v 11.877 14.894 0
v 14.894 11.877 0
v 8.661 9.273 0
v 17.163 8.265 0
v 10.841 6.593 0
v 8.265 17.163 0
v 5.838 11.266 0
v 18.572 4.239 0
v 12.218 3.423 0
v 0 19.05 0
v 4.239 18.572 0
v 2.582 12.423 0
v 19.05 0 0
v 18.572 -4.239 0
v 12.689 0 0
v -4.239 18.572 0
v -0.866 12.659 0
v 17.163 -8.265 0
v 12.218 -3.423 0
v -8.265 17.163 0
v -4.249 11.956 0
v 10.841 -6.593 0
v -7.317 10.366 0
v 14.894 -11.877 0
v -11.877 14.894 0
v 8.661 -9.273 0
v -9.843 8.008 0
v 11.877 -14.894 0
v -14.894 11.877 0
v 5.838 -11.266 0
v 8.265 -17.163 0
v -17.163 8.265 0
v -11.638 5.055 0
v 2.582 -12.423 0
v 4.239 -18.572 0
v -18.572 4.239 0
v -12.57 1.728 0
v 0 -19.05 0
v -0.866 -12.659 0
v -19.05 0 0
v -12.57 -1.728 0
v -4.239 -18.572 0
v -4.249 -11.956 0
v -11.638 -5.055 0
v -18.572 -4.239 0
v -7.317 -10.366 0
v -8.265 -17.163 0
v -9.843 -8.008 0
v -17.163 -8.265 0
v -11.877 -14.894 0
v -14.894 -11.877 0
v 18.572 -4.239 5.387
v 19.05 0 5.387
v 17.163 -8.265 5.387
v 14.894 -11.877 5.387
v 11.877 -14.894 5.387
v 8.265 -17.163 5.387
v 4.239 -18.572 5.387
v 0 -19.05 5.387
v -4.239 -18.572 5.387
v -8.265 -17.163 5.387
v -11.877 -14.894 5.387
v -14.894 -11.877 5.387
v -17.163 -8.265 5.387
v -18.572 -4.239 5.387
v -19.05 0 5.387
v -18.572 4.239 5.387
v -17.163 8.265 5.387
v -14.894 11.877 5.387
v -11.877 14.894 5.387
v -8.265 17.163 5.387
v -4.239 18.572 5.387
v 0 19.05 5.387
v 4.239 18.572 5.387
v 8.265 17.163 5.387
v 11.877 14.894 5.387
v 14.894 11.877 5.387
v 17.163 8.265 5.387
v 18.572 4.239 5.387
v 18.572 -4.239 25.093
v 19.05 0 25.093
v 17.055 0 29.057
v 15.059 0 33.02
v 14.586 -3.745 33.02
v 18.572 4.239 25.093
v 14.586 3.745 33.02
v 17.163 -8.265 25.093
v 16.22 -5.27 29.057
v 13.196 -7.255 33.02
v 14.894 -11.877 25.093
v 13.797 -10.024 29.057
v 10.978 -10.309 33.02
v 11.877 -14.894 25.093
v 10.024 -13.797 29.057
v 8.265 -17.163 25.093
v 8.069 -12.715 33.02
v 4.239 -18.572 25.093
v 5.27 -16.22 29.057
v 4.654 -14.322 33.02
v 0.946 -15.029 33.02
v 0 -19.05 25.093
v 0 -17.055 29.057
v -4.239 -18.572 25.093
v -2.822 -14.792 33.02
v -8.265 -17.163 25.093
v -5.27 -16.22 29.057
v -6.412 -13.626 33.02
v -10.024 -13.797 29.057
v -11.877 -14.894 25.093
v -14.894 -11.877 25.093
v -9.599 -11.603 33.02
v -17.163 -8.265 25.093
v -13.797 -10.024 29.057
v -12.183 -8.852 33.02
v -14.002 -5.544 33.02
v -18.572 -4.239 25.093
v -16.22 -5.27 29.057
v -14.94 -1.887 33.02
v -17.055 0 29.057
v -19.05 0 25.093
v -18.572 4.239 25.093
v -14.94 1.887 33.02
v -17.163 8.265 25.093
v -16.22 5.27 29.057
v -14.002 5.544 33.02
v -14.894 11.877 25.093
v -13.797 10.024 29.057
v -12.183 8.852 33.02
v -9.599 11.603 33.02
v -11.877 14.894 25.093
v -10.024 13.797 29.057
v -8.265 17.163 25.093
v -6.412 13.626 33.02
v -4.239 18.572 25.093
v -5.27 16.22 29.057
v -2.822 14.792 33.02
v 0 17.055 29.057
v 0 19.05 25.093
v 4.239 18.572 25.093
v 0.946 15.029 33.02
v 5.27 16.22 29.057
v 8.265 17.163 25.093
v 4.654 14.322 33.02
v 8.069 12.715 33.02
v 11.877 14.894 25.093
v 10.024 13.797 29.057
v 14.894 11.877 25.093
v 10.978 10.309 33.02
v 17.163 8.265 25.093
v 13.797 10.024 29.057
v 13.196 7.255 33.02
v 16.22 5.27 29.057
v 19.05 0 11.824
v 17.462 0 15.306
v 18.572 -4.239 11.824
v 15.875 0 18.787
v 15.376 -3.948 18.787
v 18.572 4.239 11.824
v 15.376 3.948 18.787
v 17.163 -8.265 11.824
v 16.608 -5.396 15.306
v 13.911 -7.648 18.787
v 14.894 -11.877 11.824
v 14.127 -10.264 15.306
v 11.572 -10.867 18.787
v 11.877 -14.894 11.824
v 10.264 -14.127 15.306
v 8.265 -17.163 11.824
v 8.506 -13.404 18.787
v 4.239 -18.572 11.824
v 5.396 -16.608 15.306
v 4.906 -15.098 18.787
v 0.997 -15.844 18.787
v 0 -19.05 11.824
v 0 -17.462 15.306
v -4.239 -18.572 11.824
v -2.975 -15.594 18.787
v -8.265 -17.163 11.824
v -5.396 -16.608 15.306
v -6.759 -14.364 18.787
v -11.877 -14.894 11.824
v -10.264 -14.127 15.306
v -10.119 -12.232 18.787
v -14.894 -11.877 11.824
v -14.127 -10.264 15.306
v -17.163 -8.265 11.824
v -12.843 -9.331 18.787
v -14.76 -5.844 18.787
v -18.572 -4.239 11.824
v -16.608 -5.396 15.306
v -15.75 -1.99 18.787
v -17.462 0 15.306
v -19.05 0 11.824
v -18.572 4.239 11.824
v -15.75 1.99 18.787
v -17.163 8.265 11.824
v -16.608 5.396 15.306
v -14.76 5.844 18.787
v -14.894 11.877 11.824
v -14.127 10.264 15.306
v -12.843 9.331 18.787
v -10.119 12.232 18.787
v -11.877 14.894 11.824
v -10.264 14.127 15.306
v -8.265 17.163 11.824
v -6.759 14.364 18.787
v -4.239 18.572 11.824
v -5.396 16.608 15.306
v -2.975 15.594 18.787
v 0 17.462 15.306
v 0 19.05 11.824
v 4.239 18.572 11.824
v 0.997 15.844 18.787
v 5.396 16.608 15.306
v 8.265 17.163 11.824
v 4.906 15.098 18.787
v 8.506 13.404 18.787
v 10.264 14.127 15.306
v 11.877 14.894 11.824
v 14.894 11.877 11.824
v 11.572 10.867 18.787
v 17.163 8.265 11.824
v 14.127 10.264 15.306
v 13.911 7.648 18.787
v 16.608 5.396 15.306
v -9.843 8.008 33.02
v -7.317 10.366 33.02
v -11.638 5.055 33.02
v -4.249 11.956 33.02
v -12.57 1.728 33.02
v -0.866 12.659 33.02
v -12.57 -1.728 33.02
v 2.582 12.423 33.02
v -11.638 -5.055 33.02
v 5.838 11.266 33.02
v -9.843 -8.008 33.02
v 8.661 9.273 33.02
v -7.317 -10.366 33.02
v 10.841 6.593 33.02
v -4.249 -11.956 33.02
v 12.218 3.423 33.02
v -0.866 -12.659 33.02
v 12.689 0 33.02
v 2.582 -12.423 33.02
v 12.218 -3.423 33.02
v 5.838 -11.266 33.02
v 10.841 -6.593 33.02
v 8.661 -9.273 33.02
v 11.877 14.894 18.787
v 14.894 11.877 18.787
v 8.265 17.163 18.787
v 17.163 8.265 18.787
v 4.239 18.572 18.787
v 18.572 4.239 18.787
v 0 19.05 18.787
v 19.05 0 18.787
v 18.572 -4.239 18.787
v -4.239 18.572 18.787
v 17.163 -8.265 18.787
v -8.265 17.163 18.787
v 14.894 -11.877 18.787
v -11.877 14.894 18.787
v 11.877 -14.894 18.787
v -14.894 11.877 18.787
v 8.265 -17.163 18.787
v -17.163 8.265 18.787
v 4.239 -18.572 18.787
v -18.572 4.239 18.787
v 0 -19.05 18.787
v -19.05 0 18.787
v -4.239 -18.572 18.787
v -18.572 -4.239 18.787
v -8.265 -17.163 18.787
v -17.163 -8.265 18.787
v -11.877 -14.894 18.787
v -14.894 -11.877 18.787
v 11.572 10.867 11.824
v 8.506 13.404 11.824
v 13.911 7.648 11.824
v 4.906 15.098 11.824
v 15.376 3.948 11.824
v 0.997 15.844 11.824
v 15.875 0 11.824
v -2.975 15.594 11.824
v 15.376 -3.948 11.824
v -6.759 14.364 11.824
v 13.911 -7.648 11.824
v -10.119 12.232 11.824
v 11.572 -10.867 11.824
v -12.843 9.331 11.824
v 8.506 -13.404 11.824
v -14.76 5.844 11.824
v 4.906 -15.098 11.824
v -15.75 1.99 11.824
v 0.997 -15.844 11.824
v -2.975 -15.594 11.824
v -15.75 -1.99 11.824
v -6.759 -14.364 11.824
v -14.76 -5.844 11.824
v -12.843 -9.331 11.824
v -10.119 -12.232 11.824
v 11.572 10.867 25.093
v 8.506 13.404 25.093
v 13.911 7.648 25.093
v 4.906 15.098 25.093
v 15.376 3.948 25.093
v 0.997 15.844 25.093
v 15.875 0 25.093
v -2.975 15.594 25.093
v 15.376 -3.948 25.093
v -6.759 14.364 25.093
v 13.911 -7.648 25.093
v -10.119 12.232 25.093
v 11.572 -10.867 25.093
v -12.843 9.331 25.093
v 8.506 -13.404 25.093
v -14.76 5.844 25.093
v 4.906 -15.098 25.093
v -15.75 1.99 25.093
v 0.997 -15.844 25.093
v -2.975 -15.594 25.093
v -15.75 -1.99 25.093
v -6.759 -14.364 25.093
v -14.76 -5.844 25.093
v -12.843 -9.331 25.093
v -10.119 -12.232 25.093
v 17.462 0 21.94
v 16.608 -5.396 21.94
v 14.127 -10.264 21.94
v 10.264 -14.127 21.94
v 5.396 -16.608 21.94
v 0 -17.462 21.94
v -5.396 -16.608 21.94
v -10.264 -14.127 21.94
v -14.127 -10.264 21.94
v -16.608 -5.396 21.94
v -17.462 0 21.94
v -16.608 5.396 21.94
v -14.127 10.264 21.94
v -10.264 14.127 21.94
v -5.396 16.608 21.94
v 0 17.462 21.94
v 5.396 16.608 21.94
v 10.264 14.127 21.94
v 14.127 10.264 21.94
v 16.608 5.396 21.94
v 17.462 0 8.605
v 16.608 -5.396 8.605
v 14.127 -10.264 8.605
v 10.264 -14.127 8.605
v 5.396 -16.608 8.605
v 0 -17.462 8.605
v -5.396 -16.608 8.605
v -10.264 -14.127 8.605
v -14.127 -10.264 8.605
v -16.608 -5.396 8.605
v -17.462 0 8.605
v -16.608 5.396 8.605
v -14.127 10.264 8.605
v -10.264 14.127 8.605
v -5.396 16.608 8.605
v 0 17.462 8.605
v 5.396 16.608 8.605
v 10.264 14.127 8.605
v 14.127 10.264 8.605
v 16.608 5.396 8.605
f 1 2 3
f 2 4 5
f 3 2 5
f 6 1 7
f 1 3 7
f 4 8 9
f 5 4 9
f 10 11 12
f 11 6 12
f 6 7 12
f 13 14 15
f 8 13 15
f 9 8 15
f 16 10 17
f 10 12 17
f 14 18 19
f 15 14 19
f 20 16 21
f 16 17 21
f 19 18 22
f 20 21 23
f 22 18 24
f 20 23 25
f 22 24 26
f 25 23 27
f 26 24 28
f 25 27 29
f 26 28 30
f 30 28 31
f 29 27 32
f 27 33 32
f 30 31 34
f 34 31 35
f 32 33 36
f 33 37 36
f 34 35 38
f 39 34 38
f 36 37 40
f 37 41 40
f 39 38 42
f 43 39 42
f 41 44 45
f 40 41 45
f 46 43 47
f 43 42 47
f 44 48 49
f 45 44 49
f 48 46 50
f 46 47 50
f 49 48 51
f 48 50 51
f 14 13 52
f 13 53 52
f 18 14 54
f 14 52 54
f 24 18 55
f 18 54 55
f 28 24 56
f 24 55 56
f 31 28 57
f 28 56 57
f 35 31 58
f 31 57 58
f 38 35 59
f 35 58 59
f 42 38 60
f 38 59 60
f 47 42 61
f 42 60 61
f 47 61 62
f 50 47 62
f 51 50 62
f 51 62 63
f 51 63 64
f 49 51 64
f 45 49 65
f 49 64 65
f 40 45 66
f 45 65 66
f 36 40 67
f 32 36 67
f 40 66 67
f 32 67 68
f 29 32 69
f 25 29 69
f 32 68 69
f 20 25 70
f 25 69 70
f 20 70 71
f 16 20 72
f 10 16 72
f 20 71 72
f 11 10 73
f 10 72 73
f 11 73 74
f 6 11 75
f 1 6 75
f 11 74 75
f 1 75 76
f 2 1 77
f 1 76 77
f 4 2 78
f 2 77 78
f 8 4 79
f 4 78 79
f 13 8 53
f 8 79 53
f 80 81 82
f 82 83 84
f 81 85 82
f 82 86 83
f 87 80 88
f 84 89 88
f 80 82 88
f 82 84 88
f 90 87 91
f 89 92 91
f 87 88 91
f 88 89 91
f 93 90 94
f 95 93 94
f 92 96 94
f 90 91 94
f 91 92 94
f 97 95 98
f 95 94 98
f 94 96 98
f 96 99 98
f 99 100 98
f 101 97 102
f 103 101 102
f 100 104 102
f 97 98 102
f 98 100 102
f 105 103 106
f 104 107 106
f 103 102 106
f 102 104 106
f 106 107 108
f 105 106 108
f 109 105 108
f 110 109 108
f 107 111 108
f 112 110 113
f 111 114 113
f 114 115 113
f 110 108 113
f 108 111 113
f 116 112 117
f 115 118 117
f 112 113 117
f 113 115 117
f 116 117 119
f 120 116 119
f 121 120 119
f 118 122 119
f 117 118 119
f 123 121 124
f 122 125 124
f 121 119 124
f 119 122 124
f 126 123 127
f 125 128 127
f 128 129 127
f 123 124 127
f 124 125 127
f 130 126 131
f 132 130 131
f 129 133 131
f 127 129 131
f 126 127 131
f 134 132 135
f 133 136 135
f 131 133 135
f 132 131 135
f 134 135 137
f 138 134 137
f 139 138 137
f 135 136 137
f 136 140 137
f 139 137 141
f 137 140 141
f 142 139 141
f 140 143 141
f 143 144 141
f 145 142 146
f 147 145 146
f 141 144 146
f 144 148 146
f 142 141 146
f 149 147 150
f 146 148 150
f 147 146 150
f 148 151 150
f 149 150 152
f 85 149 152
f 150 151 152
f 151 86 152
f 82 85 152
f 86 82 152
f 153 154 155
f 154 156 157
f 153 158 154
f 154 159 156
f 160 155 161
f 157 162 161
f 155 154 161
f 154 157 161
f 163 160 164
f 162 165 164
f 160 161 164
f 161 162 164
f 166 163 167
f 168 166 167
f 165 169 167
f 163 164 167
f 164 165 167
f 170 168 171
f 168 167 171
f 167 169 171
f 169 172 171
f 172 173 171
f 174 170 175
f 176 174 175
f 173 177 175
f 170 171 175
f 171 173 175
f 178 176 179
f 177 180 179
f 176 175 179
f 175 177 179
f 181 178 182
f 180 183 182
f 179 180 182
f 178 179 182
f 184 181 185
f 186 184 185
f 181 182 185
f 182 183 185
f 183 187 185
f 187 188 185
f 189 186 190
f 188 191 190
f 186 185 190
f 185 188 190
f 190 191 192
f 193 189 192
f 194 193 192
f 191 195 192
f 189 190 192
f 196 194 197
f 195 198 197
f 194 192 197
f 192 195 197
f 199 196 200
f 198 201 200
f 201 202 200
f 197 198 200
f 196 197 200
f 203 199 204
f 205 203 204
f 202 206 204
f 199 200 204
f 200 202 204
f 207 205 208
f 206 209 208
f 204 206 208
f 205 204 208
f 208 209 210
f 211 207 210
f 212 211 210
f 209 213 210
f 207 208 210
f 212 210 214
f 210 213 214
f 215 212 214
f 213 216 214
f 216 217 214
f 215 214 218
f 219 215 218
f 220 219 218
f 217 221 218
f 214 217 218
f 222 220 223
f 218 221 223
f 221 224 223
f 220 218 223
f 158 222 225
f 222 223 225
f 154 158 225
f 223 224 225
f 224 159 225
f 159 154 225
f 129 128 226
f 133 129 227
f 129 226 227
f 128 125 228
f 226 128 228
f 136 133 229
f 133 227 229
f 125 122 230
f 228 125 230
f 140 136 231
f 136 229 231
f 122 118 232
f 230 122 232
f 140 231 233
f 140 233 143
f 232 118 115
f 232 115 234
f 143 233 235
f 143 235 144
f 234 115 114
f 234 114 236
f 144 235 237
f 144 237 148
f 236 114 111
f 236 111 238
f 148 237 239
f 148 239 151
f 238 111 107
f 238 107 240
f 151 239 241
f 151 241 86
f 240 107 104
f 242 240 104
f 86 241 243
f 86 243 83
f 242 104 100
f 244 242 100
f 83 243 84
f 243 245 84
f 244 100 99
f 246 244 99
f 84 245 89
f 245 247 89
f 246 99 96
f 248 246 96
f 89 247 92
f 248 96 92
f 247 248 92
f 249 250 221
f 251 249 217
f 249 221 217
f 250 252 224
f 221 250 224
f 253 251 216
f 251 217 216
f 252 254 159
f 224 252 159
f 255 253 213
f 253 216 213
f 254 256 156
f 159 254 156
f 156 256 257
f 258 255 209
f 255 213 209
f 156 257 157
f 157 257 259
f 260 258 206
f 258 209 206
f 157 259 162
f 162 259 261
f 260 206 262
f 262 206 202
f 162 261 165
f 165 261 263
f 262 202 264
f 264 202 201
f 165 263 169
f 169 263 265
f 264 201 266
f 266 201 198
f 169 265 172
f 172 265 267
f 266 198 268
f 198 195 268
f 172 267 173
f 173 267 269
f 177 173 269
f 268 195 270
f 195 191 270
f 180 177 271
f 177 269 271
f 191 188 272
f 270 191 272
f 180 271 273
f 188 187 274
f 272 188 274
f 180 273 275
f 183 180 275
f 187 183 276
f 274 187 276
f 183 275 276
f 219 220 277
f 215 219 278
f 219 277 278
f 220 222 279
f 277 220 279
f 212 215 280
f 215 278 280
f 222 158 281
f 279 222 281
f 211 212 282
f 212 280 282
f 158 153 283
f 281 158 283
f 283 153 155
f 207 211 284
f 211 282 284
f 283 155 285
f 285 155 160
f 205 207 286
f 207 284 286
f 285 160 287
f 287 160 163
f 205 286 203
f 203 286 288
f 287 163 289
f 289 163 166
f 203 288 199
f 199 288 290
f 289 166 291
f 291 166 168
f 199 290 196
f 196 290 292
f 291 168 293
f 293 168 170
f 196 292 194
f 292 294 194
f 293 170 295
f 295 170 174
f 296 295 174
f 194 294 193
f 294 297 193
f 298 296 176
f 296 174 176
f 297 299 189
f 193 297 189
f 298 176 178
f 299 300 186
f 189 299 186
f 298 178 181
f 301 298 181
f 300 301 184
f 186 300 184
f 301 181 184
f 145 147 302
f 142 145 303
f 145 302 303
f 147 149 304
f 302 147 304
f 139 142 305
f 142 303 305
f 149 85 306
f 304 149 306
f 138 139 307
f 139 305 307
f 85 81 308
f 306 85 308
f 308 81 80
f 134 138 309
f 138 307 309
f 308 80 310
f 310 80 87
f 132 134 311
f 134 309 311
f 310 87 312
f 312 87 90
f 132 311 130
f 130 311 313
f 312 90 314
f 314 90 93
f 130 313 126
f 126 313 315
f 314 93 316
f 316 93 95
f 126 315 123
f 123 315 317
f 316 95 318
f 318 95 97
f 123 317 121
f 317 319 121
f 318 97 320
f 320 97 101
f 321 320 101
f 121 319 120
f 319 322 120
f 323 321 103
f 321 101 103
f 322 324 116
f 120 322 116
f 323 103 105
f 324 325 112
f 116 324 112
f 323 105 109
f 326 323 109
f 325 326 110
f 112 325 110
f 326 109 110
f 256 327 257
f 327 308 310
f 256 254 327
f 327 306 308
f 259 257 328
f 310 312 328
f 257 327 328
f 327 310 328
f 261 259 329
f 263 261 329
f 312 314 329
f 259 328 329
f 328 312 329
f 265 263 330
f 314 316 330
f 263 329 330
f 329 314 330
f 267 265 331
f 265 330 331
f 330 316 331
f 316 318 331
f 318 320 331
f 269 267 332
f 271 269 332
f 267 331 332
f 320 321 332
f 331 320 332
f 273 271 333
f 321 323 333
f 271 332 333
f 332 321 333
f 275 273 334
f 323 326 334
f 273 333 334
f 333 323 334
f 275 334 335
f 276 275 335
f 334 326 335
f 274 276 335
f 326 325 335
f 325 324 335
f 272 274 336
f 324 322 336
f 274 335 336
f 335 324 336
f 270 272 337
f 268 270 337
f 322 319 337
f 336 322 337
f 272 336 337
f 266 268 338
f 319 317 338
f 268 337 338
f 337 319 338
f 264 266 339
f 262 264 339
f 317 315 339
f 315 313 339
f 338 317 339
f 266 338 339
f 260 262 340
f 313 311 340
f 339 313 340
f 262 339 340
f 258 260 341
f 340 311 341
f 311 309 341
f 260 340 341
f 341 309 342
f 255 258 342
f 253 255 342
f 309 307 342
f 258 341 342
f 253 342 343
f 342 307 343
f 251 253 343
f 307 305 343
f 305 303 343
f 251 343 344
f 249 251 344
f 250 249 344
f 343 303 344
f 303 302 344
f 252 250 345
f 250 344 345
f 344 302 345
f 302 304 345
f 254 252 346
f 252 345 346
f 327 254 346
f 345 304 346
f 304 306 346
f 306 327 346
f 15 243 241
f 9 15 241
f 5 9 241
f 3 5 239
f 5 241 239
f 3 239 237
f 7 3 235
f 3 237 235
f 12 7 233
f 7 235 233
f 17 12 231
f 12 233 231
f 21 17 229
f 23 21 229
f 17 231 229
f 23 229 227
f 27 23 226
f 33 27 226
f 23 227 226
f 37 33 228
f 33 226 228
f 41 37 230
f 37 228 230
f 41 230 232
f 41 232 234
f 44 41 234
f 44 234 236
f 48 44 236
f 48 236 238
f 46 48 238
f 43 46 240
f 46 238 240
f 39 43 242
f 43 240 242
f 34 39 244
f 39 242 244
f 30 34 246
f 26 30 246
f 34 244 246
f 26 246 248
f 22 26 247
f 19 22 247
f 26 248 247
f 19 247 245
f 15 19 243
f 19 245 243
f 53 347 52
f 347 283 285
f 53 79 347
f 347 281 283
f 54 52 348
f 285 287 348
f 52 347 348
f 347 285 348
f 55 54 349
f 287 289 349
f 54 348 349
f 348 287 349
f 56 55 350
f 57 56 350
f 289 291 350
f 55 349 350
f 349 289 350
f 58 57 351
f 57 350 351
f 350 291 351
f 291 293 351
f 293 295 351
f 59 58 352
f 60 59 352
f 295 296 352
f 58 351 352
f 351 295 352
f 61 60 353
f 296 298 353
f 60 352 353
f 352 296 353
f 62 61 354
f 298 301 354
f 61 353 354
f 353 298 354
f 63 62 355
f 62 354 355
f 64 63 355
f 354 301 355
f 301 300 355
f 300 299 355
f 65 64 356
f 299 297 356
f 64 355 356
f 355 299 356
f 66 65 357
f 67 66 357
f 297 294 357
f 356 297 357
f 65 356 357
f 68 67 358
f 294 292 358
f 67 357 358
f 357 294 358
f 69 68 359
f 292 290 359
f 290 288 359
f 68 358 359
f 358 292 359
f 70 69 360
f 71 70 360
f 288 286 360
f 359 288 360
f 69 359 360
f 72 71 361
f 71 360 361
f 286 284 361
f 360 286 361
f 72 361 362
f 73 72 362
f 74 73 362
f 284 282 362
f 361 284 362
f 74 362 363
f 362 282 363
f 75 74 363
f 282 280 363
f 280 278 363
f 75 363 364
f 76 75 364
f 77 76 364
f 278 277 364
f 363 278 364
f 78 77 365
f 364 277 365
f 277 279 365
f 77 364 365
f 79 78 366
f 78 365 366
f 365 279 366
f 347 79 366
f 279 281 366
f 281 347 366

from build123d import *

# Parameters (mm, degrees)
F2_R     = 12.688559
F3_DEPTH = 33.02


with BuildPart() as f1:
    # F0 (on Front) → F1 (revolve)
    with BuildSketch(Plane.XZ):
        Polygon((0, 33.02), (0, 0), (19.05, 0), (19.05, 5.386552), (15.875, 11.824134), (19.05, 11.824134), (15.875, 18.787236), (19.05, 18.787236), (15.875, 25.09344), (19.05, 25.09344), (15.059195, 33.02), align=None)
    revolve(axis=Axis((0, 0, 16.51), (0, 0, -1)))

    # F2 (on face) → F3 (cut, through all)
    with BuildSketch(Plane.XY.offset(33.02)):
        Circle(F2_R)
    extrude(amount=-F3_DEPTH, mode=Mode.SUBTRACT)


solid = f1.part
